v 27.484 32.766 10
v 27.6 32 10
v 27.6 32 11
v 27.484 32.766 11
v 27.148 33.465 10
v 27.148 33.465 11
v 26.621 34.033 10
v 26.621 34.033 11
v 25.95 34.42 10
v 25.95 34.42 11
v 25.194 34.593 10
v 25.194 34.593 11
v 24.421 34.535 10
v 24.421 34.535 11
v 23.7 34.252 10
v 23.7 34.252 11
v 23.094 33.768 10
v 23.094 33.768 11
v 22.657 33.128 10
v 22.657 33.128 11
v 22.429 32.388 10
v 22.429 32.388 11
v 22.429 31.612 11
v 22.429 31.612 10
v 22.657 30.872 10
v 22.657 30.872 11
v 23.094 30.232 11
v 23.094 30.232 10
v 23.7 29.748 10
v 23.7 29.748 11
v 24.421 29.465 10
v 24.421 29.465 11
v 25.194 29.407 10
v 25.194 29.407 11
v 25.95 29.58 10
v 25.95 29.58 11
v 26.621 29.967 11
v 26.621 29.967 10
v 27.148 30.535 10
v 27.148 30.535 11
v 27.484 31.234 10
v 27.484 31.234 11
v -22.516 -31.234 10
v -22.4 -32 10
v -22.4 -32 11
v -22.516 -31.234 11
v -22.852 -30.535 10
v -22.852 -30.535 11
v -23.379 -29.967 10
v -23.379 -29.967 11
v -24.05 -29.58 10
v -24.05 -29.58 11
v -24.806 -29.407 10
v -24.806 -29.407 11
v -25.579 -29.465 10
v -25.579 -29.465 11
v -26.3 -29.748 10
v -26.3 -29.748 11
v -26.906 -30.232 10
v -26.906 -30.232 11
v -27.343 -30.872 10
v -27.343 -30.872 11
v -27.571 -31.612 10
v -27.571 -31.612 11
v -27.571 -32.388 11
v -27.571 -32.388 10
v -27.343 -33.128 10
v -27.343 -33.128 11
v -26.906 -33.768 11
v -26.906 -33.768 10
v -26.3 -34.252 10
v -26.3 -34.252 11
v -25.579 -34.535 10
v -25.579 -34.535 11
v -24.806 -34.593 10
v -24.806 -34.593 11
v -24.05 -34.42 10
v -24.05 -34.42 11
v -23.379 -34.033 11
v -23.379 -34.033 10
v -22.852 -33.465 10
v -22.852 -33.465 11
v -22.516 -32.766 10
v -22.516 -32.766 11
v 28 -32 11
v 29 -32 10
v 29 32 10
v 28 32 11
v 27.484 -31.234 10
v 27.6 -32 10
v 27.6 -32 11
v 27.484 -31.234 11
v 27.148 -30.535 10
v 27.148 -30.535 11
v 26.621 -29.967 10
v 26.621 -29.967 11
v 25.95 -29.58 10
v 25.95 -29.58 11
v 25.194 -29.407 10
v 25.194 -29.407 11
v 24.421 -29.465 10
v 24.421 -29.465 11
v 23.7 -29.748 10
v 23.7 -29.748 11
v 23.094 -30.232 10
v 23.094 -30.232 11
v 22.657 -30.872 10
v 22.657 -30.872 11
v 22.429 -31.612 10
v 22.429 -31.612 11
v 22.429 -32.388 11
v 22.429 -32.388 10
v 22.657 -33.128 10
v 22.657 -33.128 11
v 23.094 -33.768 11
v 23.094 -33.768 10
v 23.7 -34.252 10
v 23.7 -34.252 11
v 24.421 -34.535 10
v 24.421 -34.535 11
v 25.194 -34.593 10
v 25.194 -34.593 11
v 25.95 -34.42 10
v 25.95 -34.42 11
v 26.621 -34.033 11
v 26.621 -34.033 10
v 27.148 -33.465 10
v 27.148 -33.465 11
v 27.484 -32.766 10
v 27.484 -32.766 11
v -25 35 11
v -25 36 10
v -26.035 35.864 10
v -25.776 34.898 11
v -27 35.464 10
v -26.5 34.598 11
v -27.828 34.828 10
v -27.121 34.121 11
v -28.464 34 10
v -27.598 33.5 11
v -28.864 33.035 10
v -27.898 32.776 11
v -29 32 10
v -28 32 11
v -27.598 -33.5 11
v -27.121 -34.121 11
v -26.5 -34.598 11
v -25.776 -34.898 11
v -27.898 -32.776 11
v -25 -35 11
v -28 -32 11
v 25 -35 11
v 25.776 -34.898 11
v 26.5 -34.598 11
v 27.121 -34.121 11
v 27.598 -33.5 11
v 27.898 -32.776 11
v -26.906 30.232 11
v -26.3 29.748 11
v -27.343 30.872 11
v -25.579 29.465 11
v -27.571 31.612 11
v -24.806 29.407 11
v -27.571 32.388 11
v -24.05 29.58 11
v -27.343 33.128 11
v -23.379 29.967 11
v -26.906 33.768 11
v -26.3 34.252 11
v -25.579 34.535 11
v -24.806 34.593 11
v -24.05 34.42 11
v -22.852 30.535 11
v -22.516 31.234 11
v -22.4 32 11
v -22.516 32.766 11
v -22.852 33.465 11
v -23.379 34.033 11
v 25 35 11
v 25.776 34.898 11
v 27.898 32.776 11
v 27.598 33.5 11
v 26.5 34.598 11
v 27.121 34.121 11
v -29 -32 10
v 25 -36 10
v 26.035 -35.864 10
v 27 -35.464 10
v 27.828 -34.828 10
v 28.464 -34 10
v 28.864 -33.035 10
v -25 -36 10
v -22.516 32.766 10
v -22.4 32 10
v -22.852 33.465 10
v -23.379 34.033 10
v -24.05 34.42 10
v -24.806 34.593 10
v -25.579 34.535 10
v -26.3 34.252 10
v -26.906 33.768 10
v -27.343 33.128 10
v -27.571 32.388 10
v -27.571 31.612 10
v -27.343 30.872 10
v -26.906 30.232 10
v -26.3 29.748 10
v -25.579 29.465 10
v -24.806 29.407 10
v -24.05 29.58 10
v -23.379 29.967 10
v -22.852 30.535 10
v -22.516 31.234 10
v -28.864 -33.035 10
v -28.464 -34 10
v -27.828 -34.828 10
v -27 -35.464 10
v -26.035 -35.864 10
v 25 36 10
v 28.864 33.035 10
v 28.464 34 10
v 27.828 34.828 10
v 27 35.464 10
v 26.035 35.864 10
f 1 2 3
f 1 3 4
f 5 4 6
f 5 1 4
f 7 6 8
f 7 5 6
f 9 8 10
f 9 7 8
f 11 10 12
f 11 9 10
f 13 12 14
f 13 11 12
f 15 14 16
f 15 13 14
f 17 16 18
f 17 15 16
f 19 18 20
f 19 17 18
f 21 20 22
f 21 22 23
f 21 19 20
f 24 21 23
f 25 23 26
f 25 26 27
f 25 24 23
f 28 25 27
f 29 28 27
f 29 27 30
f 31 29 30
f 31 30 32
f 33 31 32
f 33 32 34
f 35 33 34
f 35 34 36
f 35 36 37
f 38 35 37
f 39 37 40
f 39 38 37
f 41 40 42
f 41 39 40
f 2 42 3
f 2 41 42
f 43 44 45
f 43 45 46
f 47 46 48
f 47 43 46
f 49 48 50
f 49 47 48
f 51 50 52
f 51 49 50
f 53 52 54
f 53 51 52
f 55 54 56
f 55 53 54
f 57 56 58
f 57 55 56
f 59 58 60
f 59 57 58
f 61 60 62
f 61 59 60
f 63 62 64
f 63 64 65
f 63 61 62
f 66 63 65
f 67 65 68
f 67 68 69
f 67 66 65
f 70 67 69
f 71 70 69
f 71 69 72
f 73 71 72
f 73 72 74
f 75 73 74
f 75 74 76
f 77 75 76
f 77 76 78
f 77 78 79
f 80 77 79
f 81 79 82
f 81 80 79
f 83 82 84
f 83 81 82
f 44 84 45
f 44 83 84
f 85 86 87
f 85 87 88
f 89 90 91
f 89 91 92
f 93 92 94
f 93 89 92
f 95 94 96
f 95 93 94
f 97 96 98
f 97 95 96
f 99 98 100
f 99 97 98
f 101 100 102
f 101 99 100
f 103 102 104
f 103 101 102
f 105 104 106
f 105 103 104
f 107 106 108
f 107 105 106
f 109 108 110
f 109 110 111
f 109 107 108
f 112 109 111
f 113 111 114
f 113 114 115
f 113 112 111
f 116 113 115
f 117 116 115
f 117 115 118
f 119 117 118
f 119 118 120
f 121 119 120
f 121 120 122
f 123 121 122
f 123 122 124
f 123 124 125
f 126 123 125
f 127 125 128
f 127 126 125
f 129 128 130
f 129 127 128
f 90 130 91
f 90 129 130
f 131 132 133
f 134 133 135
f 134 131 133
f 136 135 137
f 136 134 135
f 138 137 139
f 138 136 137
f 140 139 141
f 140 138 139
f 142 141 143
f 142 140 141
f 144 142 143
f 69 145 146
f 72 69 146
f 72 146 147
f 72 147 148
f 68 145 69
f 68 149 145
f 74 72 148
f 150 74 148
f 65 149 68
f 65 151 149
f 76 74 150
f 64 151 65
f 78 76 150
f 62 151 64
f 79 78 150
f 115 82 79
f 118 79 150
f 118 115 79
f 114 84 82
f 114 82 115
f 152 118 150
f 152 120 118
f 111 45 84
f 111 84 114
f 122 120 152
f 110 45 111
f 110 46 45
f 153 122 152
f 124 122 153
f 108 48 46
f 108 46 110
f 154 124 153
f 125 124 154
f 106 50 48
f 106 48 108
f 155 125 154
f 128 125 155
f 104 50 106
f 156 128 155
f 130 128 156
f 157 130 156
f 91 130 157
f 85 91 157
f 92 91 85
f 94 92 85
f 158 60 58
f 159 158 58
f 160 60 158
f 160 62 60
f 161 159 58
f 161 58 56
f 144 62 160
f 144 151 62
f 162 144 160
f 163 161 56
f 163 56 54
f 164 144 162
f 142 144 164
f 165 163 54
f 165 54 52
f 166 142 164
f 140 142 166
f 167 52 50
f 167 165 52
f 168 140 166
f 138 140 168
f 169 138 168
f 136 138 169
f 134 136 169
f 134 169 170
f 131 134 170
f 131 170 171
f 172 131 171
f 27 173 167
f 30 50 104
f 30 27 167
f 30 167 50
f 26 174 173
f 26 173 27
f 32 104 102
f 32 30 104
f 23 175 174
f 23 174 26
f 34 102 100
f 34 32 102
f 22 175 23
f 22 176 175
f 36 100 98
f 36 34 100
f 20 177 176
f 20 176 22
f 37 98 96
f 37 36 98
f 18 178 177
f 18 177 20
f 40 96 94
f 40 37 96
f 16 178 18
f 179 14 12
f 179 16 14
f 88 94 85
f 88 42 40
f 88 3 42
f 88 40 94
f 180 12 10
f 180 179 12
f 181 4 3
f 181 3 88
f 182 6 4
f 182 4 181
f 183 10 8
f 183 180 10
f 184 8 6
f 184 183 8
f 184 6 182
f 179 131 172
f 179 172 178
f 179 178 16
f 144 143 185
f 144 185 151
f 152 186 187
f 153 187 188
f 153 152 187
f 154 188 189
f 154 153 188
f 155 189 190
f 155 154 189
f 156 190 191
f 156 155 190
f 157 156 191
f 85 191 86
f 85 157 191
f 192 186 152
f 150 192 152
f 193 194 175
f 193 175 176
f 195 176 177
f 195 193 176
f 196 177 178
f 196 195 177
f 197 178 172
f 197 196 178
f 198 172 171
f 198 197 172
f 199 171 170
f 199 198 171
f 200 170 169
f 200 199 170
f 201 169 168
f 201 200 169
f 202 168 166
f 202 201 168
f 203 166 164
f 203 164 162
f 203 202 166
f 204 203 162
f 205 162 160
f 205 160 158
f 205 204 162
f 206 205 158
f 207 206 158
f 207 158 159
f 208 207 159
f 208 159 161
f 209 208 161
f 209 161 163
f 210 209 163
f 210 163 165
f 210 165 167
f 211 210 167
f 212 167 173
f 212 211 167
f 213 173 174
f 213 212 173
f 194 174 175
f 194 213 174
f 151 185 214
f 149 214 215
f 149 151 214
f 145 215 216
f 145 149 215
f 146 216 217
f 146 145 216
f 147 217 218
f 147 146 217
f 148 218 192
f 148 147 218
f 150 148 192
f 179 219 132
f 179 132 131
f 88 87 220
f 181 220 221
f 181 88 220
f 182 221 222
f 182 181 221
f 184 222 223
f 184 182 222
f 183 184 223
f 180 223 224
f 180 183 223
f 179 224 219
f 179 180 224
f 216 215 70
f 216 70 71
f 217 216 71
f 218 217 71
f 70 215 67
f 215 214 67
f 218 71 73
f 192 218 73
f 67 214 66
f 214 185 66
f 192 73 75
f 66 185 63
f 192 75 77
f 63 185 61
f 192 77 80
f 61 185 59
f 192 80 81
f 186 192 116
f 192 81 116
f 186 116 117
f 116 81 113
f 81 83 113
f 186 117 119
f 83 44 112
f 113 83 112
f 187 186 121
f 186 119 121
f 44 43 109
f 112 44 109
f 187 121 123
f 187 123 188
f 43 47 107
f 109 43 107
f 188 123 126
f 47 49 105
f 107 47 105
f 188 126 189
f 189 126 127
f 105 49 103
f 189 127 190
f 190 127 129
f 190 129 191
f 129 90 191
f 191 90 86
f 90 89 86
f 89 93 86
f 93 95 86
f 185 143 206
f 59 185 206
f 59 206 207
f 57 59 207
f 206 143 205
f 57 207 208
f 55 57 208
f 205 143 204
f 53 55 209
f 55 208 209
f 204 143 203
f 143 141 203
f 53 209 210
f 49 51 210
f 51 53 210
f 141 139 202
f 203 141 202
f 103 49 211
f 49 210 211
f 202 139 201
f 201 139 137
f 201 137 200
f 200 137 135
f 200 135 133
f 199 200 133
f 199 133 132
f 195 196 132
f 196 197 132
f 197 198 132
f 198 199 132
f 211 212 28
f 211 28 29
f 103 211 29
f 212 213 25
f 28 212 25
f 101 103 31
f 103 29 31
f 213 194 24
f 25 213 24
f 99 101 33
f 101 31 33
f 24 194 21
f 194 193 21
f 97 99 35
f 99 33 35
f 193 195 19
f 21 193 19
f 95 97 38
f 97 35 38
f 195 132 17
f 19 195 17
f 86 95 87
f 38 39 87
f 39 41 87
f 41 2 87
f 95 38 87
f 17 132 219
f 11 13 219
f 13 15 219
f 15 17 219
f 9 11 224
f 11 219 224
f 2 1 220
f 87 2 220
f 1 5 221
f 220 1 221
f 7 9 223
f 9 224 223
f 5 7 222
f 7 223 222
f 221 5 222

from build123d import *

# Parameters (mm, degrees)
SKETCH034_W      = 60
SKETCH034_H      = 74
SKETCH034_R      = 2.6
EXTRUDE039_DEPTH = 1


with BuildPart() as bevel003:
    # Sweep002: sweep along a path in Sketch041
    with BuildLine(Plane(origin=(0, 0, -2), x_dir=(1, 0, 0), z_dir=(0, 0, -1))) as sweep002_path:
        Line((-25, 35), (25, 35))
        ThreePointArc((25, 35), (27.12132, 34.12132), (28, 32))
        Line((28, 32), (28, -32))
        ThreePointArc((28, -32), (27.12132, -34.12132), (25, -35))
        Line((25, -35), (-25, -35))
        ThreePointArc((-25, -35), (-27.12132, -34.12132), (-28, -32))
        Line((-28, -32), (-28, 32))
        ThreePointArc((-28, 32), (-27.12132, 34.12132), (-25, 35))
    # Sketch040 → Sweep002 (sweep)
    with BuildSketch(Plane.XZ):
        Polygon((-28, 11), (-30, 9), (-30, 1), (-28, -1), (-28, -2), (-33, -2), (-33, 12), (-28, 12), align=None)
    sweep(path=sweep002_path.line)


with BuildPart() as cut:
    # Sketch034 → Extrude039 (new body)
    with BuildSketch(Plane.XY.offset(10)):
        Rectangle(SKETCH034_W, SKETCH034_H)
        with Locations((-25, 32)):
            Circle(SKETCH034_R, mode=Mode.SUBTRACT)
        with Locations((25, 32)):
            Circle(SKETCH034_R, mode=Mode.SUBTRACT)
        with Locations((-25, -32)):
            Circle(SKETCH034_R, mode=Mode.SUBTRACT)
        with Locations((25, -32)):
            Circle(SKETCH034_R, mode=Mode.SUBTRACT)
    extrude(amount=EXTRUDE039_DEPTH)

    # Cut: cut bevel003
    add(bevel003.part, mode=Mode.SUBTRACT)


solid = cut.part
